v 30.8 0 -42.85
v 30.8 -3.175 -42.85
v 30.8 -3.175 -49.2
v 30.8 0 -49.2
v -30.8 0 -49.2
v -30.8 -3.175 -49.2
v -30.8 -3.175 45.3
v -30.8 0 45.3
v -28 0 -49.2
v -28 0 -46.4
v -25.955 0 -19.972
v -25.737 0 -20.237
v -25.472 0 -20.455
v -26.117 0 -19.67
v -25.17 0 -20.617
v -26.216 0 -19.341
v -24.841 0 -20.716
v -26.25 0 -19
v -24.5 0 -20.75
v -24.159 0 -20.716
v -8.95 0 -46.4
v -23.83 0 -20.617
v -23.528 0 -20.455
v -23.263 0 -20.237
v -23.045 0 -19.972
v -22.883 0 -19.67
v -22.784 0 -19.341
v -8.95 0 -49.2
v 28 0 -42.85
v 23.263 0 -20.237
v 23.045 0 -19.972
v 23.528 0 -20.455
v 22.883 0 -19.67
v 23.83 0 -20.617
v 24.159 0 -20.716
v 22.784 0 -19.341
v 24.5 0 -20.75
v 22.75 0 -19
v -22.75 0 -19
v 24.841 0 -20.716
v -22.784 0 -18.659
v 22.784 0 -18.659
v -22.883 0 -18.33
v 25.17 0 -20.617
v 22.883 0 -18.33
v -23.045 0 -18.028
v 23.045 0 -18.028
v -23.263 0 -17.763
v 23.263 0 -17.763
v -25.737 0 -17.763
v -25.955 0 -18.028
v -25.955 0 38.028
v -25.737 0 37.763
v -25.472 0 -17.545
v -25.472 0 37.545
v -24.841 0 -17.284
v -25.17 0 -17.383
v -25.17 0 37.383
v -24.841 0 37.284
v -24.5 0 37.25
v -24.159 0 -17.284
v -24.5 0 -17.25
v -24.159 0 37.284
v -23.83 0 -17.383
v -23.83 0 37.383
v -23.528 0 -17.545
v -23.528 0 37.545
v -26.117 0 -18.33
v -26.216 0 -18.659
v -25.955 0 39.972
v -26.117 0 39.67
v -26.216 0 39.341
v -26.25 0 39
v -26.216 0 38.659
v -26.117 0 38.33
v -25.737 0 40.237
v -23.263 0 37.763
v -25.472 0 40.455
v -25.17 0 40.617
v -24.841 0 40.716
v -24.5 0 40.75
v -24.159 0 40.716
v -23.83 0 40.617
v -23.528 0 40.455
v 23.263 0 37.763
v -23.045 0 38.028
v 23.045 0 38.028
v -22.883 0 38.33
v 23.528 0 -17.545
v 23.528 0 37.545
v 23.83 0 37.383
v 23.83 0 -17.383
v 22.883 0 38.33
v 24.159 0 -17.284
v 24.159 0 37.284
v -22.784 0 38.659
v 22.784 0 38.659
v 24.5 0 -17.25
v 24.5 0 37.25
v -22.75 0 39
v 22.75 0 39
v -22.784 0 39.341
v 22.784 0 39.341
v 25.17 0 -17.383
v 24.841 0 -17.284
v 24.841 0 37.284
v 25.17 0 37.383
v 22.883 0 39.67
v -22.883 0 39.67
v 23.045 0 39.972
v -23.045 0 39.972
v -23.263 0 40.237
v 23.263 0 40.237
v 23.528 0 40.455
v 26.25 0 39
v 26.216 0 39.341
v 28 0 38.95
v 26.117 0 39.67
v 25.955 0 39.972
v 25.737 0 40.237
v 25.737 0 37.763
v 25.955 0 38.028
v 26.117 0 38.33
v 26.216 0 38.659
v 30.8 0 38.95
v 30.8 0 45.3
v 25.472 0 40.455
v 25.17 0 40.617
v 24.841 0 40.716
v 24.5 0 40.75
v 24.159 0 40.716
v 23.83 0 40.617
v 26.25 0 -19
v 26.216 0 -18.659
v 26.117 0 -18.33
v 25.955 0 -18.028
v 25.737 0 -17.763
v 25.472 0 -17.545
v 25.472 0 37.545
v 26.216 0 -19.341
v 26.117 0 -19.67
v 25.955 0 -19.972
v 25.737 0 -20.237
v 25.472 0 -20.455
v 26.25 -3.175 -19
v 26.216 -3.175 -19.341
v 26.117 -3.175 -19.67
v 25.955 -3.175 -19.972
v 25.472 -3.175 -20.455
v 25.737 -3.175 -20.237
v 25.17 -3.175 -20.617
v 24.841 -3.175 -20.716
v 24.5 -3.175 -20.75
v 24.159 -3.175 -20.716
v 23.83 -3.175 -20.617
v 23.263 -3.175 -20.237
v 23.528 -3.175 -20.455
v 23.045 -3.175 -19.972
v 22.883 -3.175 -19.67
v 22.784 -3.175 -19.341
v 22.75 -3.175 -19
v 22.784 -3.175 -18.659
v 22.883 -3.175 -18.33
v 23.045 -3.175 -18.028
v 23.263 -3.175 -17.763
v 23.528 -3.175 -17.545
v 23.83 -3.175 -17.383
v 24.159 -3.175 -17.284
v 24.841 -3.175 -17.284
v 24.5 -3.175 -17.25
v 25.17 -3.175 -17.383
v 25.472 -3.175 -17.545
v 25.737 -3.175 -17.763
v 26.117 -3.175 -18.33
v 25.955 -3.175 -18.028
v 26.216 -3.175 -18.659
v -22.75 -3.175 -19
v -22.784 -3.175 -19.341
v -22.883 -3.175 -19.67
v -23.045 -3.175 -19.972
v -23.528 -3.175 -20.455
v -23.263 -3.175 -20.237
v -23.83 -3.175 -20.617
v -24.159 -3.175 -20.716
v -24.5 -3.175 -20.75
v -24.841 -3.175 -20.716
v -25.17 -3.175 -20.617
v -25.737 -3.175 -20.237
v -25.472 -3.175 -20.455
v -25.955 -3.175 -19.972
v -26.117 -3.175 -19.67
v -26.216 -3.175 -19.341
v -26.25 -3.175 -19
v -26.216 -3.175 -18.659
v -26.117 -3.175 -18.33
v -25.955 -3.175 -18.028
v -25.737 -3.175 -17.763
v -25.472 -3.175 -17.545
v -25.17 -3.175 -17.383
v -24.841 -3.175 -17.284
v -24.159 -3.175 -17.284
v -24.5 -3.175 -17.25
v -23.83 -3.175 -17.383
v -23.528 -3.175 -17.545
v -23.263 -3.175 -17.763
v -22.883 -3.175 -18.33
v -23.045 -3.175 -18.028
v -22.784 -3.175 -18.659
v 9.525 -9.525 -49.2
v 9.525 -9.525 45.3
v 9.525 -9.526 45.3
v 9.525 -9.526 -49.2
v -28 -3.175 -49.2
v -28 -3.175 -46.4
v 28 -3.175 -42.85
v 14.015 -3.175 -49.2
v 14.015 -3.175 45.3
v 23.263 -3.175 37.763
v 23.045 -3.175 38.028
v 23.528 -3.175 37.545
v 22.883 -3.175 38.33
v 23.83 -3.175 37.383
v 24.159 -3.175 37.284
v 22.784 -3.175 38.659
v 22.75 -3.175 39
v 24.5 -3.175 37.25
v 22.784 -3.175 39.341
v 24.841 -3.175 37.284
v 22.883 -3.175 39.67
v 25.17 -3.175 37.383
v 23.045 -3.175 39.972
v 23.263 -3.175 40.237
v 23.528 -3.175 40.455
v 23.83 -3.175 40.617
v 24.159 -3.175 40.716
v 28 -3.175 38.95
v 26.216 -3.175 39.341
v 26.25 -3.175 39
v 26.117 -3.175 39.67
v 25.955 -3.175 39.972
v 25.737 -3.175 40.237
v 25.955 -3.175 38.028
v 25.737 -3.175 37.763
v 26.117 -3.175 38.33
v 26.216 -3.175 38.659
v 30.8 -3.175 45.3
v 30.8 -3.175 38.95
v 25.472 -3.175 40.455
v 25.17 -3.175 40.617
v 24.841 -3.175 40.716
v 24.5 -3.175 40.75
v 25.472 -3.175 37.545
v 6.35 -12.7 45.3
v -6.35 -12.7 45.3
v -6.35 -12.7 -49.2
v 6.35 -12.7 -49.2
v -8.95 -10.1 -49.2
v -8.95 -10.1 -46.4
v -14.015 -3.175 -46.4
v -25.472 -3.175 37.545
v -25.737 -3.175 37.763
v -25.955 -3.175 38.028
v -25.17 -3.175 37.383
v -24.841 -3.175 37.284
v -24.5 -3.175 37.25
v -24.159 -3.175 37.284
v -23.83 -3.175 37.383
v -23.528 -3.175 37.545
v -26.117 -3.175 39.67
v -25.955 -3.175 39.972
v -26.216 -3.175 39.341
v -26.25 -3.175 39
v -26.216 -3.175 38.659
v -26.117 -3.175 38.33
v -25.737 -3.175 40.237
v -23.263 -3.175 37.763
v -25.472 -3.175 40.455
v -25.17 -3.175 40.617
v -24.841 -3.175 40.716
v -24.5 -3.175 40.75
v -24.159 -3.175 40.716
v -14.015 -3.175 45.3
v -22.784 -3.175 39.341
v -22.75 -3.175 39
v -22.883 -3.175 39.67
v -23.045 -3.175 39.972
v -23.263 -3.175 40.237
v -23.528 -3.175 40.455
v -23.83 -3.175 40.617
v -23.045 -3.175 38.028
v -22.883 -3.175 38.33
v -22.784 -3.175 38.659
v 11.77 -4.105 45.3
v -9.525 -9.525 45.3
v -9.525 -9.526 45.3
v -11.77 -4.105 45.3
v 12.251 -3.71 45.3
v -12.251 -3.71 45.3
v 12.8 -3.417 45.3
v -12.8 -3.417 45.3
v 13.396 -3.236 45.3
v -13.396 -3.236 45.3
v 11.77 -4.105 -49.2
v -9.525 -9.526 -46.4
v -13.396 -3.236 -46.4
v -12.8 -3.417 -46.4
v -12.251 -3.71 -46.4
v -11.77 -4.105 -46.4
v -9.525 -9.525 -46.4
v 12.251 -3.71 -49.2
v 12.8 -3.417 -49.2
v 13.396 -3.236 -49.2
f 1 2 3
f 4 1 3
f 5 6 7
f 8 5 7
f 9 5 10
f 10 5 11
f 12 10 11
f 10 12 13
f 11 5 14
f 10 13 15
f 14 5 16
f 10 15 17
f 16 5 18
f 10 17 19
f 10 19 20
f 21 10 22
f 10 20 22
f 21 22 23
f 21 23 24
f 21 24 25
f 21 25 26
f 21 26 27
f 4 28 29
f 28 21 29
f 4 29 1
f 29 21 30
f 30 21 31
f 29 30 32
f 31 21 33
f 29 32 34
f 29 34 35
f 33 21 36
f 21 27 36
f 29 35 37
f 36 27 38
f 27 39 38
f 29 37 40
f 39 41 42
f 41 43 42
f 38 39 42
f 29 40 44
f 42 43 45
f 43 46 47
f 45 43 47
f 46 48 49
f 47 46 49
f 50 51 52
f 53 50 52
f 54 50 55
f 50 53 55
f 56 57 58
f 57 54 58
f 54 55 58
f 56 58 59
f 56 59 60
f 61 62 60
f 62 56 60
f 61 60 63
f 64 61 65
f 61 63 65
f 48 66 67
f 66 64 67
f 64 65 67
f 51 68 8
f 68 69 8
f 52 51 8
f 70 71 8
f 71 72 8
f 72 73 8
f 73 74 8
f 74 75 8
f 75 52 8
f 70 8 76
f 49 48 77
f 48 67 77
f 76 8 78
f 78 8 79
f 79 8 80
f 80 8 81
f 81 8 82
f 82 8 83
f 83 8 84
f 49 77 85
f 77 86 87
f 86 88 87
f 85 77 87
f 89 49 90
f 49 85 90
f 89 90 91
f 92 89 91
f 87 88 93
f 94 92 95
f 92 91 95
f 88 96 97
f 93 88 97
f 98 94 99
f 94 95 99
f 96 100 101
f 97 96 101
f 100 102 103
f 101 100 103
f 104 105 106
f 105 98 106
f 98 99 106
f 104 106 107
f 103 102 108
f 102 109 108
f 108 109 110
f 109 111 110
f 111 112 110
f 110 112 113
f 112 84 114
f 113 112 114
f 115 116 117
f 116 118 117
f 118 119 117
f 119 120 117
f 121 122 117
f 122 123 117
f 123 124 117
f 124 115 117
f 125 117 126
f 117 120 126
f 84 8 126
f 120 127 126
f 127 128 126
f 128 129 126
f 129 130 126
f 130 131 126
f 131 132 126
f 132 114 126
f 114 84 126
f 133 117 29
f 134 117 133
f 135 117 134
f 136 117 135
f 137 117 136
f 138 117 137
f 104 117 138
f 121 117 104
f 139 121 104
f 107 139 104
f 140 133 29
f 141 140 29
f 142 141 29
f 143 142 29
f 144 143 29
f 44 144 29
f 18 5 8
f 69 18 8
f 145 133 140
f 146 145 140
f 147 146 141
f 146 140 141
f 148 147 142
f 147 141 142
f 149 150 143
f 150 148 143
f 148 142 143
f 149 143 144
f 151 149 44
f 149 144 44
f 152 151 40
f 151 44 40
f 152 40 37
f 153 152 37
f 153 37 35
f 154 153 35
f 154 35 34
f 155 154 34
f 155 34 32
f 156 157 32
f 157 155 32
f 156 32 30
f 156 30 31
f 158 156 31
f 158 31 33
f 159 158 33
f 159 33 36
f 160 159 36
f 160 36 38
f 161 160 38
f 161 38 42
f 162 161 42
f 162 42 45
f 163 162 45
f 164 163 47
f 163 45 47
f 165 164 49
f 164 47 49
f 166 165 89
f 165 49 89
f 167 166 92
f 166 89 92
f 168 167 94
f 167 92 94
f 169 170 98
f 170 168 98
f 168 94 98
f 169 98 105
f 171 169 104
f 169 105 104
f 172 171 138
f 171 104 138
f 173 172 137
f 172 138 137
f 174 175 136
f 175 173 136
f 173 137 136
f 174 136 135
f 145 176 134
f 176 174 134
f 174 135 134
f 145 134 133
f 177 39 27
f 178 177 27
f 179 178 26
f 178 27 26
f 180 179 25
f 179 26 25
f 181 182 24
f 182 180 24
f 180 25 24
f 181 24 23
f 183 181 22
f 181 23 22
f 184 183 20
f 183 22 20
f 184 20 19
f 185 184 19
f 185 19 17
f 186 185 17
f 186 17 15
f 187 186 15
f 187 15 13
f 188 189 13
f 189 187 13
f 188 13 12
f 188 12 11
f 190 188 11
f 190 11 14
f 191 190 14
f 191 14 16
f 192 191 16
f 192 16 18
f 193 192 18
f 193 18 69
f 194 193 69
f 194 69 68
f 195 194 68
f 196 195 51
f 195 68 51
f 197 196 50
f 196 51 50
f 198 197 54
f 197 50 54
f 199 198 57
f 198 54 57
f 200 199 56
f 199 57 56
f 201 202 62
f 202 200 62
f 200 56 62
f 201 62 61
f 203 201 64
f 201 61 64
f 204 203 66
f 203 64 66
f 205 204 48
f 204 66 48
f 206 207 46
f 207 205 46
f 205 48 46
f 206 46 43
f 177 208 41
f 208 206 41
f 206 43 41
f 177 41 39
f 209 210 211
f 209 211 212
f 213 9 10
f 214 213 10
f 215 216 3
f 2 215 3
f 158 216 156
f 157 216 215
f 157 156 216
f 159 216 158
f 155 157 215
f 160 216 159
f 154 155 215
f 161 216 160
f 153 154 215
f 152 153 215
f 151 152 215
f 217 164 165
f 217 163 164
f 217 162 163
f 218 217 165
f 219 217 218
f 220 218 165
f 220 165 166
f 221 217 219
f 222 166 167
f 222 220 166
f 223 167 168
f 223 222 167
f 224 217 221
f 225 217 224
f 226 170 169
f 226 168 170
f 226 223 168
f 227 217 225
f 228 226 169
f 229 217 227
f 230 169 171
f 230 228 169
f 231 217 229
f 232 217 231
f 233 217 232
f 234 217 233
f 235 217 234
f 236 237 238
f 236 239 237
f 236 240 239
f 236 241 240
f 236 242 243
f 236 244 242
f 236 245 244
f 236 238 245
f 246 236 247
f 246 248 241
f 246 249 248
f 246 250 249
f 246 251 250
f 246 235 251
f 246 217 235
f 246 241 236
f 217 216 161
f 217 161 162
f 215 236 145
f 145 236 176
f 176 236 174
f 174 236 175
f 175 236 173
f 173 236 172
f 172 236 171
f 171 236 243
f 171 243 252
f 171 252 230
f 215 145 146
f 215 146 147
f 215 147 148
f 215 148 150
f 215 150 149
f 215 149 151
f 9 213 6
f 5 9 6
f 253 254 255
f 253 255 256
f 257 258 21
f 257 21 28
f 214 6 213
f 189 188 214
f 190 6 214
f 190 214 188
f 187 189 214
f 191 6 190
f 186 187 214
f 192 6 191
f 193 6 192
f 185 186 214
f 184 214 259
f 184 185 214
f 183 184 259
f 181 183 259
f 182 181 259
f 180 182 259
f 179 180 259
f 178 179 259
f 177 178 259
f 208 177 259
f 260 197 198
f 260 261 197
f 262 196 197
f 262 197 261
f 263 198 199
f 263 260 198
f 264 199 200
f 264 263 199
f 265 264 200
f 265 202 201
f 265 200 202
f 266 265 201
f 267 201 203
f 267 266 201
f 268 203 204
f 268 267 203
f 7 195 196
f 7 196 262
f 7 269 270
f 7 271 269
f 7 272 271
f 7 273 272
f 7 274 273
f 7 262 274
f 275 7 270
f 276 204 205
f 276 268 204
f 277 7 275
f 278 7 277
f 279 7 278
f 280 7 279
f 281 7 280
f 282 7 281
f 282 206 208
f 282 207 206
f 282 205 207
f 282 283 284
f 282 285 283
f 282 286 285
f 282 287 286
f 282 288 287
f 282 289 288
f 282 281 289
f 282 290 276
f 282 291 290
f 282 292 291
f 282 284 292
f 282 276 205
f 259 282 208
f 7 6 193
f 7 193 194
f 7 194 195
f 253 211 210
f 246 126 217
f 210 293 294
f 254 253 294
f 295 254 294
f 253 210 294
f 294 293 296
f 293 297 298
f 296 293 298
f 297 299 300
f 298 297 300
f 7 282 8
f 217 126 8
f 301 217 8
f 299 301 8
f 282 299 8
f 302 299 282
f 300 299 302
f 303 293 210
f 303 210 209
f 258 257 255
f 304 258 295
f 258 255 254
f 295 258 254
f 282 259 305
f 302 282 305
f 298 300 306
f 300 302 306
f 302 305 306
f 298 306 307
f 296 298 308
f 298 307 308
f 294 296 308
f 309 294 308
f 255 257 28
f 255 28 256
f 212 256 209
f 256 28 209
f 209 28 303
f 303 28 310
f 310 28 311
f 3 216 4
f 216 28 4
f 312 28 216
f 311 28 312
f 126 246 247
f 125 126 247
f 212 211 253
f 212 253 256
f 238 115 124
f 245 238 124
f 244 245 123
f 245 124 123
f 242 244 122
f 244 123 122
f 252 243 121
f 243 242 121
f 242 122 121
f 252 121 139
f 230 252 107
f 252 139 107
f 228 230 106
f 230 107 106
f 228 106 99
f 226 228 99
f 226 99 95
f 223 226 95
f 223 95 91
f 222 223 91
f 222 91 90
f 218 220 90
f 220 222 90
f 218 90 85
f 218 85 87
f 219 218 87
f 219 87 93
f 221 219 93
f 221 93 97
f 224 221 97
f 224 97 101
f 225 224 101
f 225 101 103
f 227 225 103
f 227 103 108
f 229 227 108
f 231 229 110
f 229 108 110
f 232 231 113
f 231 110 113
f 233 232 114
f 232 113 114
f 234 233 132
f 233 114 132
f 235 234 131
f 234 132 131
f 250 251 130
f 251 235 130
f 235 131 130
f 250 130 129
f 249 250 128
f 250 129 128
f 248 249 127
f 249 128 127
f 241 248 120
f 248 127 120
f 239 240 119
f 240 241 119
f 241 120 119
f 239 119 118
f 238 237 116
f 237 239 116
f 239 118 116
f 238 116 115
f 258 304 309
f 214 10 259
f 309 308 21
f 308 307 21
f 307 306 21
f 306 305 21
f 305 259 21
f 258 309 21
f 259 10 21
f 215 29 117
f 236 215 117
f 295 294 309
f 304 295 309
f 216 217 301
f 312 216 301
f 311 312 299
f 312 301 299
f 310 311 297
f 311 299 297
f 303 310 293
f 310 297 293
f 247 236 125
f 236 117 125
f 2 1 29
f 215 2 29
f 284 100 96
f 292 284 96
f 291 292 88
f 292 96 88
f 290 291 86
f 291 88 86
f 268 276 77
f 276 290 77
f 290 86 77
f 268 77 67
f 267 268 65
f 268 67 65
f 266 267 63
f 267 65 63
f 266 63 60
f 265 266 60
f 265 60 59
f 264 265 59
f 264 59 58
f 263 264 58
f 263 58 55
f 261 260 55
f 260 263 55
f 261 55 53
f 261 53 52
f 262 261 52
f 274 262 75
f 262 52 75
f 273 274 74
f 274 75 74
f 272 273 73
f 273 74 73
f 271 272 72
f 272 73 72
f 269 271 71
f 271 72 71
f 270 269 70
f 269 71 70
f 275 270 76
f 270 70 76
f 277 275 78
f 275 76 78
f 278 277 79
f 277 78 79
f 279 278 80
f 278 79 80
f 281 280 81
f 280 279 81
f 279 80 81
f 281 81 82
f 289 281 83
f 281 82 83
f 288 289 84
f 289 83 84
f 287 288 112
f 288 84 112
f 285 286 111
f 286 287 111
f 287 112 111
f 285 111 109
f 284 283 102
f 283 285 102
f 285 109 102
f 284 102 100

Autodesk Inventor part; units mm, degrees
ref_plane "YZ Plane" through (0, 0, 0) normal (1, 0, 0) x (0, 1, 0)
ref_plane "XZ Plane" through (0, 0, 0) normal (0, 1, 0) x (-1, 0, 0)
ref_plane "Work Plane3" through (-25, 0, 42.5) normal (0, -1, 0) x (1, 0, 0)
sketch "Sketch1" plane through (-25, 0, 42.5) normal (0, -1, 0) x (1, 0, 0)
  line L0 (28.4781, -19.558) -> (28.4781, -33.5534) projected
  arc A0 (53, -3) -> (50, 0) centre (50, -3) ccw projected
  line L1 (0, 0) -> (50, 0) projected
  arc A1 (0, 0) -> (-3, -3) centre (0, -3) ccw projected
  line L2 (-3, -82) -> (-3, -3) projected
  arc A2 (-3, -82) -> (0, -85) centre (0, -82) ccw projected
  line L3 (50, -85) -> (0, -85) projected
  arc A3 (50, -85) -> (53, -82) centre (50, -82) ccw projected
  line L4 (53, -3) -> (53, -82) projected
  circle A4 centre (49.5, -61.5) radius 1.75 projected
  circle A5 centre (0.5, -61.5) radius 1.75 projected
  circle A6 centre (0.5, -3.5) radius 1.75 projected
  circle A7 centre (49.5, -3.5) radius 1.75 projected
  line L5 (-3, 0) -> (53, 0)
  line L6 (53, 0) -> (53, -88.9)
  line L7 (53, -88.9) -> (-3, -88.9)
  line L8 (-3, -88.9) -> (-3, 0)
  point P0 (25, -42.5)
  dimension "d0" = 88.9
extrude "Extrusion1" add sketch "Sketch1" along normal blind 3.175
sketch "Sketch2" plane through (-25, -3.175, 42.5) normal (0, -1, 0) x (1, 0, 0)
  circle A0 centre (49.5, -3.5) radius 1.75 projected
  circle A1 centre (0.5, -3.5) radius 1.75 projected
  circle A2 centre (0.5, -61.5) radius 1.75 projected
  circle A3 centre (49.5, -61.5) radius 1.75 projected
  line L0 (53, 0) -> (-3, 0) projected
  line L1 (-3, 0) -> (-3, -88.9) projected
  line L2 (-3, -88.9) -> (53, -88.9) projected
  line L3 (53, -88.9) -> (53, 0) projected
  line L4 (-3, -88.9) -> (53, -88.9) projected
  line L5 (55.8, 2.8) -> (55.8, -91.7)
  line L6 (-5.8, -91.7) -> (-5.8, 2.8)
  line L7 (53, 0) -> (55.8, 2.8)
  line L8 (53, 0) -> (58.3967, 0) construction
  line L9 (55.8, 2.8) -> (-5.8, 2.8)
  line L10 (53, -88.9) -> (61.5609, -88.9) construction
  line L11 (55.8, -91.7) -> (-5.8, -91.7)
  point P0 (25, -42.5)
  dimension "d3" = 45
extrude "Extrusion2" add sketch "Sketch2" against normal blind 3.175 contours L5 L11 L6 L9
sketch "Sketch3" plane through (-25, 0, 42.5) normal (0, 1, 0) x (1, 0, 0)
  line L0 (-5.8, -2.8) -> (55.8, -2.8) projected
  line L1 (55.8, -2.8) -> (55.8, 91.7) projected
  line L2 (55.8, 91.7) -> (-5.8, 91.7) projected
  line L3 (-5.8, 91.7) -> (-5.8, -2.8) projected
  line L4 (53, 3.55) -> (55.8, 3.55)
  line L5 (55.8, 3.55) -> (55.8, 85.35)
  line L6 (55.8, 85.35) -> (53, 85.35)
  line L7 (53, 85.35) -> (53, 3.55)
  point P0 (25, 42.5)
  dimension "d7" = 6.35
  dimension "d20" = 6.35
extrude "Extrusion3" cut sketch "Sketch3" against normal blind 15.875 contours L4 L7 L6 L1
sketch "Sketch5" plane through (-25, 0, 42.5) normal (0, 1, 0) x (1, 0, 0)
  line L0 (-3, 88.9) -> (16.05, 88.9)
  line L1 (16.05, 88.9) -> (16.05, 91.7575)
  line L2 (16.05, 91.7575) -> (-3, 91.7575)
  line L3 (-3, 91.7575) -> (-3, 88.9)
  line L4 (55.8, 3.55) -> (53, 3.55) projected
  line L5 (53, 85.35) -> (55.8, 85.35) projected
  line L6 (55.8, 85.35) -> (55.8, 91.7) projected
  line L7 (55.8, 91.7) -> (-5.8, 91.7) projected
  line L8 (-5.8, 91.7) -> (-5.8, -2.8) projected
  line L9 (-5.8, -2.8) -> (55.8, -2.8) projected
  line L10 (55.8, -2.8) -> (55.8, 3.55) projected
  line L11 (53, 3.55) -> (53, 85.35) projected
  point P0 (25, 42.5)
  dimension "d15" = 19.05
  dimension "d16" = 2.8575
extrude "Extrusion5" cut sketch "Sketch5" against normal blind 15.875 contours L3 L7 L1 L0 | L3 L2 L1 L7
sketch "Sketch6" plane through (-25, -3.175, 42.5) normal (0, -1, 0) x (1, 0, 0)
  line L0 (16.05, -88.9) -> (16.05, -91.7) projected
  line L1 (16.05, -91.7) -> (55.8, -91.7) projected
  line L2 (55.8, -91.7) -> (55.8, -85.35) projected
  line L3 (55.8, -85.35) -> (53, -85.35) projected
  line L4 (53, -85.35) -> (53, -3.55) projected
  line L5 (53, -3.55) -> (55.8, -3.55) projected
  line L6 (55.8, -3.55) -> (55.8, 2.8) projected
  line L7 (55.8, 2.8) -> (-5.8, 2.8) projected
  line L8 (-5.8, 2.8) -> (-5.8, -91.7) projected
  line L9 (-5.8, -91.7) -> (-3, -91.7) projected
  line L10 (-3, -91.7) -> (-3, -88.9) projected
  line L11 (-3, -88.9) -> (16.05, -88.9) projected
  circle A0 centre (49.5, -61.5) radius 1.75 projected
  circle A1 centre (0.5, -61.5) radius 1.75 projected
  circle A2 centre (0.5, -3.5) radius 1.75 projected
  circle A3 centre (49.5, -3.5) radius 1.75 projected
  line L12 (34.525, 2.8) -> (34.525, -0.0575) projected
  line L13 (16.05, -88.9) -> (-3, -88.9) projected
  line L14 (16.05, -0.0575) -> (15.475, -0.0575)
  line L15 (15.475, -0.0575) -> (15.475, -88.9)
  line L16 (15.475, -88.9) -> (16.05, -88.9)
  line L17 (34.525, -88.9) -> (34.525, -0.0575)
  line L18 (16.05, -91.7) -> (55.8, -91.7) projected
  line L19 (16.05, -88.9) -> (16.05, -91.7)
  line L20 (16.05, -91.7) -> (34.525, -91.7)
  line L21 (34.525, -91.7) -> (34.525, -88.9)
  line L22 (15.475, -0.0575) -> (16.05, -0.0575)
  line L23 (34.525, -0.0575) -> (34.525, 2.8)
  line L24 (34.525, 2.8) -> (15.475, 2.8)
  line L25 (15.475, 2.8) -> (15.475, -0.0575)
  point P0 (25, -42.5)
extrude "Extrusion6" add sketch "Sketch6" along normal blind 9.525 contours L11 L15 L25 L7 L12 L17 L21 L1 L0
chamfer "Chamfer1" distance 3.175 angle 45 2 edges at (-9.525, -3.175, -0.55) (9.525, -3.175, -1.95)
chamfer "Chamfer2" distance 3.175 angle 45 2 edges at (9.525, -6.35, -1.95) (-9.525, -6.35, -0.55)
chamfer "Chamfer3" distance 3.175 angle 45 2 edges at (9.525, -12.7, -1.95) (-9.525, -12.7, -0.55)
fillet "Fillet1" radius 3.175 2 edges at (-12.7, -3.175, -0.55) (12.7, -3.175, -1.95)
properties part number "Raspi3B+_Case"
